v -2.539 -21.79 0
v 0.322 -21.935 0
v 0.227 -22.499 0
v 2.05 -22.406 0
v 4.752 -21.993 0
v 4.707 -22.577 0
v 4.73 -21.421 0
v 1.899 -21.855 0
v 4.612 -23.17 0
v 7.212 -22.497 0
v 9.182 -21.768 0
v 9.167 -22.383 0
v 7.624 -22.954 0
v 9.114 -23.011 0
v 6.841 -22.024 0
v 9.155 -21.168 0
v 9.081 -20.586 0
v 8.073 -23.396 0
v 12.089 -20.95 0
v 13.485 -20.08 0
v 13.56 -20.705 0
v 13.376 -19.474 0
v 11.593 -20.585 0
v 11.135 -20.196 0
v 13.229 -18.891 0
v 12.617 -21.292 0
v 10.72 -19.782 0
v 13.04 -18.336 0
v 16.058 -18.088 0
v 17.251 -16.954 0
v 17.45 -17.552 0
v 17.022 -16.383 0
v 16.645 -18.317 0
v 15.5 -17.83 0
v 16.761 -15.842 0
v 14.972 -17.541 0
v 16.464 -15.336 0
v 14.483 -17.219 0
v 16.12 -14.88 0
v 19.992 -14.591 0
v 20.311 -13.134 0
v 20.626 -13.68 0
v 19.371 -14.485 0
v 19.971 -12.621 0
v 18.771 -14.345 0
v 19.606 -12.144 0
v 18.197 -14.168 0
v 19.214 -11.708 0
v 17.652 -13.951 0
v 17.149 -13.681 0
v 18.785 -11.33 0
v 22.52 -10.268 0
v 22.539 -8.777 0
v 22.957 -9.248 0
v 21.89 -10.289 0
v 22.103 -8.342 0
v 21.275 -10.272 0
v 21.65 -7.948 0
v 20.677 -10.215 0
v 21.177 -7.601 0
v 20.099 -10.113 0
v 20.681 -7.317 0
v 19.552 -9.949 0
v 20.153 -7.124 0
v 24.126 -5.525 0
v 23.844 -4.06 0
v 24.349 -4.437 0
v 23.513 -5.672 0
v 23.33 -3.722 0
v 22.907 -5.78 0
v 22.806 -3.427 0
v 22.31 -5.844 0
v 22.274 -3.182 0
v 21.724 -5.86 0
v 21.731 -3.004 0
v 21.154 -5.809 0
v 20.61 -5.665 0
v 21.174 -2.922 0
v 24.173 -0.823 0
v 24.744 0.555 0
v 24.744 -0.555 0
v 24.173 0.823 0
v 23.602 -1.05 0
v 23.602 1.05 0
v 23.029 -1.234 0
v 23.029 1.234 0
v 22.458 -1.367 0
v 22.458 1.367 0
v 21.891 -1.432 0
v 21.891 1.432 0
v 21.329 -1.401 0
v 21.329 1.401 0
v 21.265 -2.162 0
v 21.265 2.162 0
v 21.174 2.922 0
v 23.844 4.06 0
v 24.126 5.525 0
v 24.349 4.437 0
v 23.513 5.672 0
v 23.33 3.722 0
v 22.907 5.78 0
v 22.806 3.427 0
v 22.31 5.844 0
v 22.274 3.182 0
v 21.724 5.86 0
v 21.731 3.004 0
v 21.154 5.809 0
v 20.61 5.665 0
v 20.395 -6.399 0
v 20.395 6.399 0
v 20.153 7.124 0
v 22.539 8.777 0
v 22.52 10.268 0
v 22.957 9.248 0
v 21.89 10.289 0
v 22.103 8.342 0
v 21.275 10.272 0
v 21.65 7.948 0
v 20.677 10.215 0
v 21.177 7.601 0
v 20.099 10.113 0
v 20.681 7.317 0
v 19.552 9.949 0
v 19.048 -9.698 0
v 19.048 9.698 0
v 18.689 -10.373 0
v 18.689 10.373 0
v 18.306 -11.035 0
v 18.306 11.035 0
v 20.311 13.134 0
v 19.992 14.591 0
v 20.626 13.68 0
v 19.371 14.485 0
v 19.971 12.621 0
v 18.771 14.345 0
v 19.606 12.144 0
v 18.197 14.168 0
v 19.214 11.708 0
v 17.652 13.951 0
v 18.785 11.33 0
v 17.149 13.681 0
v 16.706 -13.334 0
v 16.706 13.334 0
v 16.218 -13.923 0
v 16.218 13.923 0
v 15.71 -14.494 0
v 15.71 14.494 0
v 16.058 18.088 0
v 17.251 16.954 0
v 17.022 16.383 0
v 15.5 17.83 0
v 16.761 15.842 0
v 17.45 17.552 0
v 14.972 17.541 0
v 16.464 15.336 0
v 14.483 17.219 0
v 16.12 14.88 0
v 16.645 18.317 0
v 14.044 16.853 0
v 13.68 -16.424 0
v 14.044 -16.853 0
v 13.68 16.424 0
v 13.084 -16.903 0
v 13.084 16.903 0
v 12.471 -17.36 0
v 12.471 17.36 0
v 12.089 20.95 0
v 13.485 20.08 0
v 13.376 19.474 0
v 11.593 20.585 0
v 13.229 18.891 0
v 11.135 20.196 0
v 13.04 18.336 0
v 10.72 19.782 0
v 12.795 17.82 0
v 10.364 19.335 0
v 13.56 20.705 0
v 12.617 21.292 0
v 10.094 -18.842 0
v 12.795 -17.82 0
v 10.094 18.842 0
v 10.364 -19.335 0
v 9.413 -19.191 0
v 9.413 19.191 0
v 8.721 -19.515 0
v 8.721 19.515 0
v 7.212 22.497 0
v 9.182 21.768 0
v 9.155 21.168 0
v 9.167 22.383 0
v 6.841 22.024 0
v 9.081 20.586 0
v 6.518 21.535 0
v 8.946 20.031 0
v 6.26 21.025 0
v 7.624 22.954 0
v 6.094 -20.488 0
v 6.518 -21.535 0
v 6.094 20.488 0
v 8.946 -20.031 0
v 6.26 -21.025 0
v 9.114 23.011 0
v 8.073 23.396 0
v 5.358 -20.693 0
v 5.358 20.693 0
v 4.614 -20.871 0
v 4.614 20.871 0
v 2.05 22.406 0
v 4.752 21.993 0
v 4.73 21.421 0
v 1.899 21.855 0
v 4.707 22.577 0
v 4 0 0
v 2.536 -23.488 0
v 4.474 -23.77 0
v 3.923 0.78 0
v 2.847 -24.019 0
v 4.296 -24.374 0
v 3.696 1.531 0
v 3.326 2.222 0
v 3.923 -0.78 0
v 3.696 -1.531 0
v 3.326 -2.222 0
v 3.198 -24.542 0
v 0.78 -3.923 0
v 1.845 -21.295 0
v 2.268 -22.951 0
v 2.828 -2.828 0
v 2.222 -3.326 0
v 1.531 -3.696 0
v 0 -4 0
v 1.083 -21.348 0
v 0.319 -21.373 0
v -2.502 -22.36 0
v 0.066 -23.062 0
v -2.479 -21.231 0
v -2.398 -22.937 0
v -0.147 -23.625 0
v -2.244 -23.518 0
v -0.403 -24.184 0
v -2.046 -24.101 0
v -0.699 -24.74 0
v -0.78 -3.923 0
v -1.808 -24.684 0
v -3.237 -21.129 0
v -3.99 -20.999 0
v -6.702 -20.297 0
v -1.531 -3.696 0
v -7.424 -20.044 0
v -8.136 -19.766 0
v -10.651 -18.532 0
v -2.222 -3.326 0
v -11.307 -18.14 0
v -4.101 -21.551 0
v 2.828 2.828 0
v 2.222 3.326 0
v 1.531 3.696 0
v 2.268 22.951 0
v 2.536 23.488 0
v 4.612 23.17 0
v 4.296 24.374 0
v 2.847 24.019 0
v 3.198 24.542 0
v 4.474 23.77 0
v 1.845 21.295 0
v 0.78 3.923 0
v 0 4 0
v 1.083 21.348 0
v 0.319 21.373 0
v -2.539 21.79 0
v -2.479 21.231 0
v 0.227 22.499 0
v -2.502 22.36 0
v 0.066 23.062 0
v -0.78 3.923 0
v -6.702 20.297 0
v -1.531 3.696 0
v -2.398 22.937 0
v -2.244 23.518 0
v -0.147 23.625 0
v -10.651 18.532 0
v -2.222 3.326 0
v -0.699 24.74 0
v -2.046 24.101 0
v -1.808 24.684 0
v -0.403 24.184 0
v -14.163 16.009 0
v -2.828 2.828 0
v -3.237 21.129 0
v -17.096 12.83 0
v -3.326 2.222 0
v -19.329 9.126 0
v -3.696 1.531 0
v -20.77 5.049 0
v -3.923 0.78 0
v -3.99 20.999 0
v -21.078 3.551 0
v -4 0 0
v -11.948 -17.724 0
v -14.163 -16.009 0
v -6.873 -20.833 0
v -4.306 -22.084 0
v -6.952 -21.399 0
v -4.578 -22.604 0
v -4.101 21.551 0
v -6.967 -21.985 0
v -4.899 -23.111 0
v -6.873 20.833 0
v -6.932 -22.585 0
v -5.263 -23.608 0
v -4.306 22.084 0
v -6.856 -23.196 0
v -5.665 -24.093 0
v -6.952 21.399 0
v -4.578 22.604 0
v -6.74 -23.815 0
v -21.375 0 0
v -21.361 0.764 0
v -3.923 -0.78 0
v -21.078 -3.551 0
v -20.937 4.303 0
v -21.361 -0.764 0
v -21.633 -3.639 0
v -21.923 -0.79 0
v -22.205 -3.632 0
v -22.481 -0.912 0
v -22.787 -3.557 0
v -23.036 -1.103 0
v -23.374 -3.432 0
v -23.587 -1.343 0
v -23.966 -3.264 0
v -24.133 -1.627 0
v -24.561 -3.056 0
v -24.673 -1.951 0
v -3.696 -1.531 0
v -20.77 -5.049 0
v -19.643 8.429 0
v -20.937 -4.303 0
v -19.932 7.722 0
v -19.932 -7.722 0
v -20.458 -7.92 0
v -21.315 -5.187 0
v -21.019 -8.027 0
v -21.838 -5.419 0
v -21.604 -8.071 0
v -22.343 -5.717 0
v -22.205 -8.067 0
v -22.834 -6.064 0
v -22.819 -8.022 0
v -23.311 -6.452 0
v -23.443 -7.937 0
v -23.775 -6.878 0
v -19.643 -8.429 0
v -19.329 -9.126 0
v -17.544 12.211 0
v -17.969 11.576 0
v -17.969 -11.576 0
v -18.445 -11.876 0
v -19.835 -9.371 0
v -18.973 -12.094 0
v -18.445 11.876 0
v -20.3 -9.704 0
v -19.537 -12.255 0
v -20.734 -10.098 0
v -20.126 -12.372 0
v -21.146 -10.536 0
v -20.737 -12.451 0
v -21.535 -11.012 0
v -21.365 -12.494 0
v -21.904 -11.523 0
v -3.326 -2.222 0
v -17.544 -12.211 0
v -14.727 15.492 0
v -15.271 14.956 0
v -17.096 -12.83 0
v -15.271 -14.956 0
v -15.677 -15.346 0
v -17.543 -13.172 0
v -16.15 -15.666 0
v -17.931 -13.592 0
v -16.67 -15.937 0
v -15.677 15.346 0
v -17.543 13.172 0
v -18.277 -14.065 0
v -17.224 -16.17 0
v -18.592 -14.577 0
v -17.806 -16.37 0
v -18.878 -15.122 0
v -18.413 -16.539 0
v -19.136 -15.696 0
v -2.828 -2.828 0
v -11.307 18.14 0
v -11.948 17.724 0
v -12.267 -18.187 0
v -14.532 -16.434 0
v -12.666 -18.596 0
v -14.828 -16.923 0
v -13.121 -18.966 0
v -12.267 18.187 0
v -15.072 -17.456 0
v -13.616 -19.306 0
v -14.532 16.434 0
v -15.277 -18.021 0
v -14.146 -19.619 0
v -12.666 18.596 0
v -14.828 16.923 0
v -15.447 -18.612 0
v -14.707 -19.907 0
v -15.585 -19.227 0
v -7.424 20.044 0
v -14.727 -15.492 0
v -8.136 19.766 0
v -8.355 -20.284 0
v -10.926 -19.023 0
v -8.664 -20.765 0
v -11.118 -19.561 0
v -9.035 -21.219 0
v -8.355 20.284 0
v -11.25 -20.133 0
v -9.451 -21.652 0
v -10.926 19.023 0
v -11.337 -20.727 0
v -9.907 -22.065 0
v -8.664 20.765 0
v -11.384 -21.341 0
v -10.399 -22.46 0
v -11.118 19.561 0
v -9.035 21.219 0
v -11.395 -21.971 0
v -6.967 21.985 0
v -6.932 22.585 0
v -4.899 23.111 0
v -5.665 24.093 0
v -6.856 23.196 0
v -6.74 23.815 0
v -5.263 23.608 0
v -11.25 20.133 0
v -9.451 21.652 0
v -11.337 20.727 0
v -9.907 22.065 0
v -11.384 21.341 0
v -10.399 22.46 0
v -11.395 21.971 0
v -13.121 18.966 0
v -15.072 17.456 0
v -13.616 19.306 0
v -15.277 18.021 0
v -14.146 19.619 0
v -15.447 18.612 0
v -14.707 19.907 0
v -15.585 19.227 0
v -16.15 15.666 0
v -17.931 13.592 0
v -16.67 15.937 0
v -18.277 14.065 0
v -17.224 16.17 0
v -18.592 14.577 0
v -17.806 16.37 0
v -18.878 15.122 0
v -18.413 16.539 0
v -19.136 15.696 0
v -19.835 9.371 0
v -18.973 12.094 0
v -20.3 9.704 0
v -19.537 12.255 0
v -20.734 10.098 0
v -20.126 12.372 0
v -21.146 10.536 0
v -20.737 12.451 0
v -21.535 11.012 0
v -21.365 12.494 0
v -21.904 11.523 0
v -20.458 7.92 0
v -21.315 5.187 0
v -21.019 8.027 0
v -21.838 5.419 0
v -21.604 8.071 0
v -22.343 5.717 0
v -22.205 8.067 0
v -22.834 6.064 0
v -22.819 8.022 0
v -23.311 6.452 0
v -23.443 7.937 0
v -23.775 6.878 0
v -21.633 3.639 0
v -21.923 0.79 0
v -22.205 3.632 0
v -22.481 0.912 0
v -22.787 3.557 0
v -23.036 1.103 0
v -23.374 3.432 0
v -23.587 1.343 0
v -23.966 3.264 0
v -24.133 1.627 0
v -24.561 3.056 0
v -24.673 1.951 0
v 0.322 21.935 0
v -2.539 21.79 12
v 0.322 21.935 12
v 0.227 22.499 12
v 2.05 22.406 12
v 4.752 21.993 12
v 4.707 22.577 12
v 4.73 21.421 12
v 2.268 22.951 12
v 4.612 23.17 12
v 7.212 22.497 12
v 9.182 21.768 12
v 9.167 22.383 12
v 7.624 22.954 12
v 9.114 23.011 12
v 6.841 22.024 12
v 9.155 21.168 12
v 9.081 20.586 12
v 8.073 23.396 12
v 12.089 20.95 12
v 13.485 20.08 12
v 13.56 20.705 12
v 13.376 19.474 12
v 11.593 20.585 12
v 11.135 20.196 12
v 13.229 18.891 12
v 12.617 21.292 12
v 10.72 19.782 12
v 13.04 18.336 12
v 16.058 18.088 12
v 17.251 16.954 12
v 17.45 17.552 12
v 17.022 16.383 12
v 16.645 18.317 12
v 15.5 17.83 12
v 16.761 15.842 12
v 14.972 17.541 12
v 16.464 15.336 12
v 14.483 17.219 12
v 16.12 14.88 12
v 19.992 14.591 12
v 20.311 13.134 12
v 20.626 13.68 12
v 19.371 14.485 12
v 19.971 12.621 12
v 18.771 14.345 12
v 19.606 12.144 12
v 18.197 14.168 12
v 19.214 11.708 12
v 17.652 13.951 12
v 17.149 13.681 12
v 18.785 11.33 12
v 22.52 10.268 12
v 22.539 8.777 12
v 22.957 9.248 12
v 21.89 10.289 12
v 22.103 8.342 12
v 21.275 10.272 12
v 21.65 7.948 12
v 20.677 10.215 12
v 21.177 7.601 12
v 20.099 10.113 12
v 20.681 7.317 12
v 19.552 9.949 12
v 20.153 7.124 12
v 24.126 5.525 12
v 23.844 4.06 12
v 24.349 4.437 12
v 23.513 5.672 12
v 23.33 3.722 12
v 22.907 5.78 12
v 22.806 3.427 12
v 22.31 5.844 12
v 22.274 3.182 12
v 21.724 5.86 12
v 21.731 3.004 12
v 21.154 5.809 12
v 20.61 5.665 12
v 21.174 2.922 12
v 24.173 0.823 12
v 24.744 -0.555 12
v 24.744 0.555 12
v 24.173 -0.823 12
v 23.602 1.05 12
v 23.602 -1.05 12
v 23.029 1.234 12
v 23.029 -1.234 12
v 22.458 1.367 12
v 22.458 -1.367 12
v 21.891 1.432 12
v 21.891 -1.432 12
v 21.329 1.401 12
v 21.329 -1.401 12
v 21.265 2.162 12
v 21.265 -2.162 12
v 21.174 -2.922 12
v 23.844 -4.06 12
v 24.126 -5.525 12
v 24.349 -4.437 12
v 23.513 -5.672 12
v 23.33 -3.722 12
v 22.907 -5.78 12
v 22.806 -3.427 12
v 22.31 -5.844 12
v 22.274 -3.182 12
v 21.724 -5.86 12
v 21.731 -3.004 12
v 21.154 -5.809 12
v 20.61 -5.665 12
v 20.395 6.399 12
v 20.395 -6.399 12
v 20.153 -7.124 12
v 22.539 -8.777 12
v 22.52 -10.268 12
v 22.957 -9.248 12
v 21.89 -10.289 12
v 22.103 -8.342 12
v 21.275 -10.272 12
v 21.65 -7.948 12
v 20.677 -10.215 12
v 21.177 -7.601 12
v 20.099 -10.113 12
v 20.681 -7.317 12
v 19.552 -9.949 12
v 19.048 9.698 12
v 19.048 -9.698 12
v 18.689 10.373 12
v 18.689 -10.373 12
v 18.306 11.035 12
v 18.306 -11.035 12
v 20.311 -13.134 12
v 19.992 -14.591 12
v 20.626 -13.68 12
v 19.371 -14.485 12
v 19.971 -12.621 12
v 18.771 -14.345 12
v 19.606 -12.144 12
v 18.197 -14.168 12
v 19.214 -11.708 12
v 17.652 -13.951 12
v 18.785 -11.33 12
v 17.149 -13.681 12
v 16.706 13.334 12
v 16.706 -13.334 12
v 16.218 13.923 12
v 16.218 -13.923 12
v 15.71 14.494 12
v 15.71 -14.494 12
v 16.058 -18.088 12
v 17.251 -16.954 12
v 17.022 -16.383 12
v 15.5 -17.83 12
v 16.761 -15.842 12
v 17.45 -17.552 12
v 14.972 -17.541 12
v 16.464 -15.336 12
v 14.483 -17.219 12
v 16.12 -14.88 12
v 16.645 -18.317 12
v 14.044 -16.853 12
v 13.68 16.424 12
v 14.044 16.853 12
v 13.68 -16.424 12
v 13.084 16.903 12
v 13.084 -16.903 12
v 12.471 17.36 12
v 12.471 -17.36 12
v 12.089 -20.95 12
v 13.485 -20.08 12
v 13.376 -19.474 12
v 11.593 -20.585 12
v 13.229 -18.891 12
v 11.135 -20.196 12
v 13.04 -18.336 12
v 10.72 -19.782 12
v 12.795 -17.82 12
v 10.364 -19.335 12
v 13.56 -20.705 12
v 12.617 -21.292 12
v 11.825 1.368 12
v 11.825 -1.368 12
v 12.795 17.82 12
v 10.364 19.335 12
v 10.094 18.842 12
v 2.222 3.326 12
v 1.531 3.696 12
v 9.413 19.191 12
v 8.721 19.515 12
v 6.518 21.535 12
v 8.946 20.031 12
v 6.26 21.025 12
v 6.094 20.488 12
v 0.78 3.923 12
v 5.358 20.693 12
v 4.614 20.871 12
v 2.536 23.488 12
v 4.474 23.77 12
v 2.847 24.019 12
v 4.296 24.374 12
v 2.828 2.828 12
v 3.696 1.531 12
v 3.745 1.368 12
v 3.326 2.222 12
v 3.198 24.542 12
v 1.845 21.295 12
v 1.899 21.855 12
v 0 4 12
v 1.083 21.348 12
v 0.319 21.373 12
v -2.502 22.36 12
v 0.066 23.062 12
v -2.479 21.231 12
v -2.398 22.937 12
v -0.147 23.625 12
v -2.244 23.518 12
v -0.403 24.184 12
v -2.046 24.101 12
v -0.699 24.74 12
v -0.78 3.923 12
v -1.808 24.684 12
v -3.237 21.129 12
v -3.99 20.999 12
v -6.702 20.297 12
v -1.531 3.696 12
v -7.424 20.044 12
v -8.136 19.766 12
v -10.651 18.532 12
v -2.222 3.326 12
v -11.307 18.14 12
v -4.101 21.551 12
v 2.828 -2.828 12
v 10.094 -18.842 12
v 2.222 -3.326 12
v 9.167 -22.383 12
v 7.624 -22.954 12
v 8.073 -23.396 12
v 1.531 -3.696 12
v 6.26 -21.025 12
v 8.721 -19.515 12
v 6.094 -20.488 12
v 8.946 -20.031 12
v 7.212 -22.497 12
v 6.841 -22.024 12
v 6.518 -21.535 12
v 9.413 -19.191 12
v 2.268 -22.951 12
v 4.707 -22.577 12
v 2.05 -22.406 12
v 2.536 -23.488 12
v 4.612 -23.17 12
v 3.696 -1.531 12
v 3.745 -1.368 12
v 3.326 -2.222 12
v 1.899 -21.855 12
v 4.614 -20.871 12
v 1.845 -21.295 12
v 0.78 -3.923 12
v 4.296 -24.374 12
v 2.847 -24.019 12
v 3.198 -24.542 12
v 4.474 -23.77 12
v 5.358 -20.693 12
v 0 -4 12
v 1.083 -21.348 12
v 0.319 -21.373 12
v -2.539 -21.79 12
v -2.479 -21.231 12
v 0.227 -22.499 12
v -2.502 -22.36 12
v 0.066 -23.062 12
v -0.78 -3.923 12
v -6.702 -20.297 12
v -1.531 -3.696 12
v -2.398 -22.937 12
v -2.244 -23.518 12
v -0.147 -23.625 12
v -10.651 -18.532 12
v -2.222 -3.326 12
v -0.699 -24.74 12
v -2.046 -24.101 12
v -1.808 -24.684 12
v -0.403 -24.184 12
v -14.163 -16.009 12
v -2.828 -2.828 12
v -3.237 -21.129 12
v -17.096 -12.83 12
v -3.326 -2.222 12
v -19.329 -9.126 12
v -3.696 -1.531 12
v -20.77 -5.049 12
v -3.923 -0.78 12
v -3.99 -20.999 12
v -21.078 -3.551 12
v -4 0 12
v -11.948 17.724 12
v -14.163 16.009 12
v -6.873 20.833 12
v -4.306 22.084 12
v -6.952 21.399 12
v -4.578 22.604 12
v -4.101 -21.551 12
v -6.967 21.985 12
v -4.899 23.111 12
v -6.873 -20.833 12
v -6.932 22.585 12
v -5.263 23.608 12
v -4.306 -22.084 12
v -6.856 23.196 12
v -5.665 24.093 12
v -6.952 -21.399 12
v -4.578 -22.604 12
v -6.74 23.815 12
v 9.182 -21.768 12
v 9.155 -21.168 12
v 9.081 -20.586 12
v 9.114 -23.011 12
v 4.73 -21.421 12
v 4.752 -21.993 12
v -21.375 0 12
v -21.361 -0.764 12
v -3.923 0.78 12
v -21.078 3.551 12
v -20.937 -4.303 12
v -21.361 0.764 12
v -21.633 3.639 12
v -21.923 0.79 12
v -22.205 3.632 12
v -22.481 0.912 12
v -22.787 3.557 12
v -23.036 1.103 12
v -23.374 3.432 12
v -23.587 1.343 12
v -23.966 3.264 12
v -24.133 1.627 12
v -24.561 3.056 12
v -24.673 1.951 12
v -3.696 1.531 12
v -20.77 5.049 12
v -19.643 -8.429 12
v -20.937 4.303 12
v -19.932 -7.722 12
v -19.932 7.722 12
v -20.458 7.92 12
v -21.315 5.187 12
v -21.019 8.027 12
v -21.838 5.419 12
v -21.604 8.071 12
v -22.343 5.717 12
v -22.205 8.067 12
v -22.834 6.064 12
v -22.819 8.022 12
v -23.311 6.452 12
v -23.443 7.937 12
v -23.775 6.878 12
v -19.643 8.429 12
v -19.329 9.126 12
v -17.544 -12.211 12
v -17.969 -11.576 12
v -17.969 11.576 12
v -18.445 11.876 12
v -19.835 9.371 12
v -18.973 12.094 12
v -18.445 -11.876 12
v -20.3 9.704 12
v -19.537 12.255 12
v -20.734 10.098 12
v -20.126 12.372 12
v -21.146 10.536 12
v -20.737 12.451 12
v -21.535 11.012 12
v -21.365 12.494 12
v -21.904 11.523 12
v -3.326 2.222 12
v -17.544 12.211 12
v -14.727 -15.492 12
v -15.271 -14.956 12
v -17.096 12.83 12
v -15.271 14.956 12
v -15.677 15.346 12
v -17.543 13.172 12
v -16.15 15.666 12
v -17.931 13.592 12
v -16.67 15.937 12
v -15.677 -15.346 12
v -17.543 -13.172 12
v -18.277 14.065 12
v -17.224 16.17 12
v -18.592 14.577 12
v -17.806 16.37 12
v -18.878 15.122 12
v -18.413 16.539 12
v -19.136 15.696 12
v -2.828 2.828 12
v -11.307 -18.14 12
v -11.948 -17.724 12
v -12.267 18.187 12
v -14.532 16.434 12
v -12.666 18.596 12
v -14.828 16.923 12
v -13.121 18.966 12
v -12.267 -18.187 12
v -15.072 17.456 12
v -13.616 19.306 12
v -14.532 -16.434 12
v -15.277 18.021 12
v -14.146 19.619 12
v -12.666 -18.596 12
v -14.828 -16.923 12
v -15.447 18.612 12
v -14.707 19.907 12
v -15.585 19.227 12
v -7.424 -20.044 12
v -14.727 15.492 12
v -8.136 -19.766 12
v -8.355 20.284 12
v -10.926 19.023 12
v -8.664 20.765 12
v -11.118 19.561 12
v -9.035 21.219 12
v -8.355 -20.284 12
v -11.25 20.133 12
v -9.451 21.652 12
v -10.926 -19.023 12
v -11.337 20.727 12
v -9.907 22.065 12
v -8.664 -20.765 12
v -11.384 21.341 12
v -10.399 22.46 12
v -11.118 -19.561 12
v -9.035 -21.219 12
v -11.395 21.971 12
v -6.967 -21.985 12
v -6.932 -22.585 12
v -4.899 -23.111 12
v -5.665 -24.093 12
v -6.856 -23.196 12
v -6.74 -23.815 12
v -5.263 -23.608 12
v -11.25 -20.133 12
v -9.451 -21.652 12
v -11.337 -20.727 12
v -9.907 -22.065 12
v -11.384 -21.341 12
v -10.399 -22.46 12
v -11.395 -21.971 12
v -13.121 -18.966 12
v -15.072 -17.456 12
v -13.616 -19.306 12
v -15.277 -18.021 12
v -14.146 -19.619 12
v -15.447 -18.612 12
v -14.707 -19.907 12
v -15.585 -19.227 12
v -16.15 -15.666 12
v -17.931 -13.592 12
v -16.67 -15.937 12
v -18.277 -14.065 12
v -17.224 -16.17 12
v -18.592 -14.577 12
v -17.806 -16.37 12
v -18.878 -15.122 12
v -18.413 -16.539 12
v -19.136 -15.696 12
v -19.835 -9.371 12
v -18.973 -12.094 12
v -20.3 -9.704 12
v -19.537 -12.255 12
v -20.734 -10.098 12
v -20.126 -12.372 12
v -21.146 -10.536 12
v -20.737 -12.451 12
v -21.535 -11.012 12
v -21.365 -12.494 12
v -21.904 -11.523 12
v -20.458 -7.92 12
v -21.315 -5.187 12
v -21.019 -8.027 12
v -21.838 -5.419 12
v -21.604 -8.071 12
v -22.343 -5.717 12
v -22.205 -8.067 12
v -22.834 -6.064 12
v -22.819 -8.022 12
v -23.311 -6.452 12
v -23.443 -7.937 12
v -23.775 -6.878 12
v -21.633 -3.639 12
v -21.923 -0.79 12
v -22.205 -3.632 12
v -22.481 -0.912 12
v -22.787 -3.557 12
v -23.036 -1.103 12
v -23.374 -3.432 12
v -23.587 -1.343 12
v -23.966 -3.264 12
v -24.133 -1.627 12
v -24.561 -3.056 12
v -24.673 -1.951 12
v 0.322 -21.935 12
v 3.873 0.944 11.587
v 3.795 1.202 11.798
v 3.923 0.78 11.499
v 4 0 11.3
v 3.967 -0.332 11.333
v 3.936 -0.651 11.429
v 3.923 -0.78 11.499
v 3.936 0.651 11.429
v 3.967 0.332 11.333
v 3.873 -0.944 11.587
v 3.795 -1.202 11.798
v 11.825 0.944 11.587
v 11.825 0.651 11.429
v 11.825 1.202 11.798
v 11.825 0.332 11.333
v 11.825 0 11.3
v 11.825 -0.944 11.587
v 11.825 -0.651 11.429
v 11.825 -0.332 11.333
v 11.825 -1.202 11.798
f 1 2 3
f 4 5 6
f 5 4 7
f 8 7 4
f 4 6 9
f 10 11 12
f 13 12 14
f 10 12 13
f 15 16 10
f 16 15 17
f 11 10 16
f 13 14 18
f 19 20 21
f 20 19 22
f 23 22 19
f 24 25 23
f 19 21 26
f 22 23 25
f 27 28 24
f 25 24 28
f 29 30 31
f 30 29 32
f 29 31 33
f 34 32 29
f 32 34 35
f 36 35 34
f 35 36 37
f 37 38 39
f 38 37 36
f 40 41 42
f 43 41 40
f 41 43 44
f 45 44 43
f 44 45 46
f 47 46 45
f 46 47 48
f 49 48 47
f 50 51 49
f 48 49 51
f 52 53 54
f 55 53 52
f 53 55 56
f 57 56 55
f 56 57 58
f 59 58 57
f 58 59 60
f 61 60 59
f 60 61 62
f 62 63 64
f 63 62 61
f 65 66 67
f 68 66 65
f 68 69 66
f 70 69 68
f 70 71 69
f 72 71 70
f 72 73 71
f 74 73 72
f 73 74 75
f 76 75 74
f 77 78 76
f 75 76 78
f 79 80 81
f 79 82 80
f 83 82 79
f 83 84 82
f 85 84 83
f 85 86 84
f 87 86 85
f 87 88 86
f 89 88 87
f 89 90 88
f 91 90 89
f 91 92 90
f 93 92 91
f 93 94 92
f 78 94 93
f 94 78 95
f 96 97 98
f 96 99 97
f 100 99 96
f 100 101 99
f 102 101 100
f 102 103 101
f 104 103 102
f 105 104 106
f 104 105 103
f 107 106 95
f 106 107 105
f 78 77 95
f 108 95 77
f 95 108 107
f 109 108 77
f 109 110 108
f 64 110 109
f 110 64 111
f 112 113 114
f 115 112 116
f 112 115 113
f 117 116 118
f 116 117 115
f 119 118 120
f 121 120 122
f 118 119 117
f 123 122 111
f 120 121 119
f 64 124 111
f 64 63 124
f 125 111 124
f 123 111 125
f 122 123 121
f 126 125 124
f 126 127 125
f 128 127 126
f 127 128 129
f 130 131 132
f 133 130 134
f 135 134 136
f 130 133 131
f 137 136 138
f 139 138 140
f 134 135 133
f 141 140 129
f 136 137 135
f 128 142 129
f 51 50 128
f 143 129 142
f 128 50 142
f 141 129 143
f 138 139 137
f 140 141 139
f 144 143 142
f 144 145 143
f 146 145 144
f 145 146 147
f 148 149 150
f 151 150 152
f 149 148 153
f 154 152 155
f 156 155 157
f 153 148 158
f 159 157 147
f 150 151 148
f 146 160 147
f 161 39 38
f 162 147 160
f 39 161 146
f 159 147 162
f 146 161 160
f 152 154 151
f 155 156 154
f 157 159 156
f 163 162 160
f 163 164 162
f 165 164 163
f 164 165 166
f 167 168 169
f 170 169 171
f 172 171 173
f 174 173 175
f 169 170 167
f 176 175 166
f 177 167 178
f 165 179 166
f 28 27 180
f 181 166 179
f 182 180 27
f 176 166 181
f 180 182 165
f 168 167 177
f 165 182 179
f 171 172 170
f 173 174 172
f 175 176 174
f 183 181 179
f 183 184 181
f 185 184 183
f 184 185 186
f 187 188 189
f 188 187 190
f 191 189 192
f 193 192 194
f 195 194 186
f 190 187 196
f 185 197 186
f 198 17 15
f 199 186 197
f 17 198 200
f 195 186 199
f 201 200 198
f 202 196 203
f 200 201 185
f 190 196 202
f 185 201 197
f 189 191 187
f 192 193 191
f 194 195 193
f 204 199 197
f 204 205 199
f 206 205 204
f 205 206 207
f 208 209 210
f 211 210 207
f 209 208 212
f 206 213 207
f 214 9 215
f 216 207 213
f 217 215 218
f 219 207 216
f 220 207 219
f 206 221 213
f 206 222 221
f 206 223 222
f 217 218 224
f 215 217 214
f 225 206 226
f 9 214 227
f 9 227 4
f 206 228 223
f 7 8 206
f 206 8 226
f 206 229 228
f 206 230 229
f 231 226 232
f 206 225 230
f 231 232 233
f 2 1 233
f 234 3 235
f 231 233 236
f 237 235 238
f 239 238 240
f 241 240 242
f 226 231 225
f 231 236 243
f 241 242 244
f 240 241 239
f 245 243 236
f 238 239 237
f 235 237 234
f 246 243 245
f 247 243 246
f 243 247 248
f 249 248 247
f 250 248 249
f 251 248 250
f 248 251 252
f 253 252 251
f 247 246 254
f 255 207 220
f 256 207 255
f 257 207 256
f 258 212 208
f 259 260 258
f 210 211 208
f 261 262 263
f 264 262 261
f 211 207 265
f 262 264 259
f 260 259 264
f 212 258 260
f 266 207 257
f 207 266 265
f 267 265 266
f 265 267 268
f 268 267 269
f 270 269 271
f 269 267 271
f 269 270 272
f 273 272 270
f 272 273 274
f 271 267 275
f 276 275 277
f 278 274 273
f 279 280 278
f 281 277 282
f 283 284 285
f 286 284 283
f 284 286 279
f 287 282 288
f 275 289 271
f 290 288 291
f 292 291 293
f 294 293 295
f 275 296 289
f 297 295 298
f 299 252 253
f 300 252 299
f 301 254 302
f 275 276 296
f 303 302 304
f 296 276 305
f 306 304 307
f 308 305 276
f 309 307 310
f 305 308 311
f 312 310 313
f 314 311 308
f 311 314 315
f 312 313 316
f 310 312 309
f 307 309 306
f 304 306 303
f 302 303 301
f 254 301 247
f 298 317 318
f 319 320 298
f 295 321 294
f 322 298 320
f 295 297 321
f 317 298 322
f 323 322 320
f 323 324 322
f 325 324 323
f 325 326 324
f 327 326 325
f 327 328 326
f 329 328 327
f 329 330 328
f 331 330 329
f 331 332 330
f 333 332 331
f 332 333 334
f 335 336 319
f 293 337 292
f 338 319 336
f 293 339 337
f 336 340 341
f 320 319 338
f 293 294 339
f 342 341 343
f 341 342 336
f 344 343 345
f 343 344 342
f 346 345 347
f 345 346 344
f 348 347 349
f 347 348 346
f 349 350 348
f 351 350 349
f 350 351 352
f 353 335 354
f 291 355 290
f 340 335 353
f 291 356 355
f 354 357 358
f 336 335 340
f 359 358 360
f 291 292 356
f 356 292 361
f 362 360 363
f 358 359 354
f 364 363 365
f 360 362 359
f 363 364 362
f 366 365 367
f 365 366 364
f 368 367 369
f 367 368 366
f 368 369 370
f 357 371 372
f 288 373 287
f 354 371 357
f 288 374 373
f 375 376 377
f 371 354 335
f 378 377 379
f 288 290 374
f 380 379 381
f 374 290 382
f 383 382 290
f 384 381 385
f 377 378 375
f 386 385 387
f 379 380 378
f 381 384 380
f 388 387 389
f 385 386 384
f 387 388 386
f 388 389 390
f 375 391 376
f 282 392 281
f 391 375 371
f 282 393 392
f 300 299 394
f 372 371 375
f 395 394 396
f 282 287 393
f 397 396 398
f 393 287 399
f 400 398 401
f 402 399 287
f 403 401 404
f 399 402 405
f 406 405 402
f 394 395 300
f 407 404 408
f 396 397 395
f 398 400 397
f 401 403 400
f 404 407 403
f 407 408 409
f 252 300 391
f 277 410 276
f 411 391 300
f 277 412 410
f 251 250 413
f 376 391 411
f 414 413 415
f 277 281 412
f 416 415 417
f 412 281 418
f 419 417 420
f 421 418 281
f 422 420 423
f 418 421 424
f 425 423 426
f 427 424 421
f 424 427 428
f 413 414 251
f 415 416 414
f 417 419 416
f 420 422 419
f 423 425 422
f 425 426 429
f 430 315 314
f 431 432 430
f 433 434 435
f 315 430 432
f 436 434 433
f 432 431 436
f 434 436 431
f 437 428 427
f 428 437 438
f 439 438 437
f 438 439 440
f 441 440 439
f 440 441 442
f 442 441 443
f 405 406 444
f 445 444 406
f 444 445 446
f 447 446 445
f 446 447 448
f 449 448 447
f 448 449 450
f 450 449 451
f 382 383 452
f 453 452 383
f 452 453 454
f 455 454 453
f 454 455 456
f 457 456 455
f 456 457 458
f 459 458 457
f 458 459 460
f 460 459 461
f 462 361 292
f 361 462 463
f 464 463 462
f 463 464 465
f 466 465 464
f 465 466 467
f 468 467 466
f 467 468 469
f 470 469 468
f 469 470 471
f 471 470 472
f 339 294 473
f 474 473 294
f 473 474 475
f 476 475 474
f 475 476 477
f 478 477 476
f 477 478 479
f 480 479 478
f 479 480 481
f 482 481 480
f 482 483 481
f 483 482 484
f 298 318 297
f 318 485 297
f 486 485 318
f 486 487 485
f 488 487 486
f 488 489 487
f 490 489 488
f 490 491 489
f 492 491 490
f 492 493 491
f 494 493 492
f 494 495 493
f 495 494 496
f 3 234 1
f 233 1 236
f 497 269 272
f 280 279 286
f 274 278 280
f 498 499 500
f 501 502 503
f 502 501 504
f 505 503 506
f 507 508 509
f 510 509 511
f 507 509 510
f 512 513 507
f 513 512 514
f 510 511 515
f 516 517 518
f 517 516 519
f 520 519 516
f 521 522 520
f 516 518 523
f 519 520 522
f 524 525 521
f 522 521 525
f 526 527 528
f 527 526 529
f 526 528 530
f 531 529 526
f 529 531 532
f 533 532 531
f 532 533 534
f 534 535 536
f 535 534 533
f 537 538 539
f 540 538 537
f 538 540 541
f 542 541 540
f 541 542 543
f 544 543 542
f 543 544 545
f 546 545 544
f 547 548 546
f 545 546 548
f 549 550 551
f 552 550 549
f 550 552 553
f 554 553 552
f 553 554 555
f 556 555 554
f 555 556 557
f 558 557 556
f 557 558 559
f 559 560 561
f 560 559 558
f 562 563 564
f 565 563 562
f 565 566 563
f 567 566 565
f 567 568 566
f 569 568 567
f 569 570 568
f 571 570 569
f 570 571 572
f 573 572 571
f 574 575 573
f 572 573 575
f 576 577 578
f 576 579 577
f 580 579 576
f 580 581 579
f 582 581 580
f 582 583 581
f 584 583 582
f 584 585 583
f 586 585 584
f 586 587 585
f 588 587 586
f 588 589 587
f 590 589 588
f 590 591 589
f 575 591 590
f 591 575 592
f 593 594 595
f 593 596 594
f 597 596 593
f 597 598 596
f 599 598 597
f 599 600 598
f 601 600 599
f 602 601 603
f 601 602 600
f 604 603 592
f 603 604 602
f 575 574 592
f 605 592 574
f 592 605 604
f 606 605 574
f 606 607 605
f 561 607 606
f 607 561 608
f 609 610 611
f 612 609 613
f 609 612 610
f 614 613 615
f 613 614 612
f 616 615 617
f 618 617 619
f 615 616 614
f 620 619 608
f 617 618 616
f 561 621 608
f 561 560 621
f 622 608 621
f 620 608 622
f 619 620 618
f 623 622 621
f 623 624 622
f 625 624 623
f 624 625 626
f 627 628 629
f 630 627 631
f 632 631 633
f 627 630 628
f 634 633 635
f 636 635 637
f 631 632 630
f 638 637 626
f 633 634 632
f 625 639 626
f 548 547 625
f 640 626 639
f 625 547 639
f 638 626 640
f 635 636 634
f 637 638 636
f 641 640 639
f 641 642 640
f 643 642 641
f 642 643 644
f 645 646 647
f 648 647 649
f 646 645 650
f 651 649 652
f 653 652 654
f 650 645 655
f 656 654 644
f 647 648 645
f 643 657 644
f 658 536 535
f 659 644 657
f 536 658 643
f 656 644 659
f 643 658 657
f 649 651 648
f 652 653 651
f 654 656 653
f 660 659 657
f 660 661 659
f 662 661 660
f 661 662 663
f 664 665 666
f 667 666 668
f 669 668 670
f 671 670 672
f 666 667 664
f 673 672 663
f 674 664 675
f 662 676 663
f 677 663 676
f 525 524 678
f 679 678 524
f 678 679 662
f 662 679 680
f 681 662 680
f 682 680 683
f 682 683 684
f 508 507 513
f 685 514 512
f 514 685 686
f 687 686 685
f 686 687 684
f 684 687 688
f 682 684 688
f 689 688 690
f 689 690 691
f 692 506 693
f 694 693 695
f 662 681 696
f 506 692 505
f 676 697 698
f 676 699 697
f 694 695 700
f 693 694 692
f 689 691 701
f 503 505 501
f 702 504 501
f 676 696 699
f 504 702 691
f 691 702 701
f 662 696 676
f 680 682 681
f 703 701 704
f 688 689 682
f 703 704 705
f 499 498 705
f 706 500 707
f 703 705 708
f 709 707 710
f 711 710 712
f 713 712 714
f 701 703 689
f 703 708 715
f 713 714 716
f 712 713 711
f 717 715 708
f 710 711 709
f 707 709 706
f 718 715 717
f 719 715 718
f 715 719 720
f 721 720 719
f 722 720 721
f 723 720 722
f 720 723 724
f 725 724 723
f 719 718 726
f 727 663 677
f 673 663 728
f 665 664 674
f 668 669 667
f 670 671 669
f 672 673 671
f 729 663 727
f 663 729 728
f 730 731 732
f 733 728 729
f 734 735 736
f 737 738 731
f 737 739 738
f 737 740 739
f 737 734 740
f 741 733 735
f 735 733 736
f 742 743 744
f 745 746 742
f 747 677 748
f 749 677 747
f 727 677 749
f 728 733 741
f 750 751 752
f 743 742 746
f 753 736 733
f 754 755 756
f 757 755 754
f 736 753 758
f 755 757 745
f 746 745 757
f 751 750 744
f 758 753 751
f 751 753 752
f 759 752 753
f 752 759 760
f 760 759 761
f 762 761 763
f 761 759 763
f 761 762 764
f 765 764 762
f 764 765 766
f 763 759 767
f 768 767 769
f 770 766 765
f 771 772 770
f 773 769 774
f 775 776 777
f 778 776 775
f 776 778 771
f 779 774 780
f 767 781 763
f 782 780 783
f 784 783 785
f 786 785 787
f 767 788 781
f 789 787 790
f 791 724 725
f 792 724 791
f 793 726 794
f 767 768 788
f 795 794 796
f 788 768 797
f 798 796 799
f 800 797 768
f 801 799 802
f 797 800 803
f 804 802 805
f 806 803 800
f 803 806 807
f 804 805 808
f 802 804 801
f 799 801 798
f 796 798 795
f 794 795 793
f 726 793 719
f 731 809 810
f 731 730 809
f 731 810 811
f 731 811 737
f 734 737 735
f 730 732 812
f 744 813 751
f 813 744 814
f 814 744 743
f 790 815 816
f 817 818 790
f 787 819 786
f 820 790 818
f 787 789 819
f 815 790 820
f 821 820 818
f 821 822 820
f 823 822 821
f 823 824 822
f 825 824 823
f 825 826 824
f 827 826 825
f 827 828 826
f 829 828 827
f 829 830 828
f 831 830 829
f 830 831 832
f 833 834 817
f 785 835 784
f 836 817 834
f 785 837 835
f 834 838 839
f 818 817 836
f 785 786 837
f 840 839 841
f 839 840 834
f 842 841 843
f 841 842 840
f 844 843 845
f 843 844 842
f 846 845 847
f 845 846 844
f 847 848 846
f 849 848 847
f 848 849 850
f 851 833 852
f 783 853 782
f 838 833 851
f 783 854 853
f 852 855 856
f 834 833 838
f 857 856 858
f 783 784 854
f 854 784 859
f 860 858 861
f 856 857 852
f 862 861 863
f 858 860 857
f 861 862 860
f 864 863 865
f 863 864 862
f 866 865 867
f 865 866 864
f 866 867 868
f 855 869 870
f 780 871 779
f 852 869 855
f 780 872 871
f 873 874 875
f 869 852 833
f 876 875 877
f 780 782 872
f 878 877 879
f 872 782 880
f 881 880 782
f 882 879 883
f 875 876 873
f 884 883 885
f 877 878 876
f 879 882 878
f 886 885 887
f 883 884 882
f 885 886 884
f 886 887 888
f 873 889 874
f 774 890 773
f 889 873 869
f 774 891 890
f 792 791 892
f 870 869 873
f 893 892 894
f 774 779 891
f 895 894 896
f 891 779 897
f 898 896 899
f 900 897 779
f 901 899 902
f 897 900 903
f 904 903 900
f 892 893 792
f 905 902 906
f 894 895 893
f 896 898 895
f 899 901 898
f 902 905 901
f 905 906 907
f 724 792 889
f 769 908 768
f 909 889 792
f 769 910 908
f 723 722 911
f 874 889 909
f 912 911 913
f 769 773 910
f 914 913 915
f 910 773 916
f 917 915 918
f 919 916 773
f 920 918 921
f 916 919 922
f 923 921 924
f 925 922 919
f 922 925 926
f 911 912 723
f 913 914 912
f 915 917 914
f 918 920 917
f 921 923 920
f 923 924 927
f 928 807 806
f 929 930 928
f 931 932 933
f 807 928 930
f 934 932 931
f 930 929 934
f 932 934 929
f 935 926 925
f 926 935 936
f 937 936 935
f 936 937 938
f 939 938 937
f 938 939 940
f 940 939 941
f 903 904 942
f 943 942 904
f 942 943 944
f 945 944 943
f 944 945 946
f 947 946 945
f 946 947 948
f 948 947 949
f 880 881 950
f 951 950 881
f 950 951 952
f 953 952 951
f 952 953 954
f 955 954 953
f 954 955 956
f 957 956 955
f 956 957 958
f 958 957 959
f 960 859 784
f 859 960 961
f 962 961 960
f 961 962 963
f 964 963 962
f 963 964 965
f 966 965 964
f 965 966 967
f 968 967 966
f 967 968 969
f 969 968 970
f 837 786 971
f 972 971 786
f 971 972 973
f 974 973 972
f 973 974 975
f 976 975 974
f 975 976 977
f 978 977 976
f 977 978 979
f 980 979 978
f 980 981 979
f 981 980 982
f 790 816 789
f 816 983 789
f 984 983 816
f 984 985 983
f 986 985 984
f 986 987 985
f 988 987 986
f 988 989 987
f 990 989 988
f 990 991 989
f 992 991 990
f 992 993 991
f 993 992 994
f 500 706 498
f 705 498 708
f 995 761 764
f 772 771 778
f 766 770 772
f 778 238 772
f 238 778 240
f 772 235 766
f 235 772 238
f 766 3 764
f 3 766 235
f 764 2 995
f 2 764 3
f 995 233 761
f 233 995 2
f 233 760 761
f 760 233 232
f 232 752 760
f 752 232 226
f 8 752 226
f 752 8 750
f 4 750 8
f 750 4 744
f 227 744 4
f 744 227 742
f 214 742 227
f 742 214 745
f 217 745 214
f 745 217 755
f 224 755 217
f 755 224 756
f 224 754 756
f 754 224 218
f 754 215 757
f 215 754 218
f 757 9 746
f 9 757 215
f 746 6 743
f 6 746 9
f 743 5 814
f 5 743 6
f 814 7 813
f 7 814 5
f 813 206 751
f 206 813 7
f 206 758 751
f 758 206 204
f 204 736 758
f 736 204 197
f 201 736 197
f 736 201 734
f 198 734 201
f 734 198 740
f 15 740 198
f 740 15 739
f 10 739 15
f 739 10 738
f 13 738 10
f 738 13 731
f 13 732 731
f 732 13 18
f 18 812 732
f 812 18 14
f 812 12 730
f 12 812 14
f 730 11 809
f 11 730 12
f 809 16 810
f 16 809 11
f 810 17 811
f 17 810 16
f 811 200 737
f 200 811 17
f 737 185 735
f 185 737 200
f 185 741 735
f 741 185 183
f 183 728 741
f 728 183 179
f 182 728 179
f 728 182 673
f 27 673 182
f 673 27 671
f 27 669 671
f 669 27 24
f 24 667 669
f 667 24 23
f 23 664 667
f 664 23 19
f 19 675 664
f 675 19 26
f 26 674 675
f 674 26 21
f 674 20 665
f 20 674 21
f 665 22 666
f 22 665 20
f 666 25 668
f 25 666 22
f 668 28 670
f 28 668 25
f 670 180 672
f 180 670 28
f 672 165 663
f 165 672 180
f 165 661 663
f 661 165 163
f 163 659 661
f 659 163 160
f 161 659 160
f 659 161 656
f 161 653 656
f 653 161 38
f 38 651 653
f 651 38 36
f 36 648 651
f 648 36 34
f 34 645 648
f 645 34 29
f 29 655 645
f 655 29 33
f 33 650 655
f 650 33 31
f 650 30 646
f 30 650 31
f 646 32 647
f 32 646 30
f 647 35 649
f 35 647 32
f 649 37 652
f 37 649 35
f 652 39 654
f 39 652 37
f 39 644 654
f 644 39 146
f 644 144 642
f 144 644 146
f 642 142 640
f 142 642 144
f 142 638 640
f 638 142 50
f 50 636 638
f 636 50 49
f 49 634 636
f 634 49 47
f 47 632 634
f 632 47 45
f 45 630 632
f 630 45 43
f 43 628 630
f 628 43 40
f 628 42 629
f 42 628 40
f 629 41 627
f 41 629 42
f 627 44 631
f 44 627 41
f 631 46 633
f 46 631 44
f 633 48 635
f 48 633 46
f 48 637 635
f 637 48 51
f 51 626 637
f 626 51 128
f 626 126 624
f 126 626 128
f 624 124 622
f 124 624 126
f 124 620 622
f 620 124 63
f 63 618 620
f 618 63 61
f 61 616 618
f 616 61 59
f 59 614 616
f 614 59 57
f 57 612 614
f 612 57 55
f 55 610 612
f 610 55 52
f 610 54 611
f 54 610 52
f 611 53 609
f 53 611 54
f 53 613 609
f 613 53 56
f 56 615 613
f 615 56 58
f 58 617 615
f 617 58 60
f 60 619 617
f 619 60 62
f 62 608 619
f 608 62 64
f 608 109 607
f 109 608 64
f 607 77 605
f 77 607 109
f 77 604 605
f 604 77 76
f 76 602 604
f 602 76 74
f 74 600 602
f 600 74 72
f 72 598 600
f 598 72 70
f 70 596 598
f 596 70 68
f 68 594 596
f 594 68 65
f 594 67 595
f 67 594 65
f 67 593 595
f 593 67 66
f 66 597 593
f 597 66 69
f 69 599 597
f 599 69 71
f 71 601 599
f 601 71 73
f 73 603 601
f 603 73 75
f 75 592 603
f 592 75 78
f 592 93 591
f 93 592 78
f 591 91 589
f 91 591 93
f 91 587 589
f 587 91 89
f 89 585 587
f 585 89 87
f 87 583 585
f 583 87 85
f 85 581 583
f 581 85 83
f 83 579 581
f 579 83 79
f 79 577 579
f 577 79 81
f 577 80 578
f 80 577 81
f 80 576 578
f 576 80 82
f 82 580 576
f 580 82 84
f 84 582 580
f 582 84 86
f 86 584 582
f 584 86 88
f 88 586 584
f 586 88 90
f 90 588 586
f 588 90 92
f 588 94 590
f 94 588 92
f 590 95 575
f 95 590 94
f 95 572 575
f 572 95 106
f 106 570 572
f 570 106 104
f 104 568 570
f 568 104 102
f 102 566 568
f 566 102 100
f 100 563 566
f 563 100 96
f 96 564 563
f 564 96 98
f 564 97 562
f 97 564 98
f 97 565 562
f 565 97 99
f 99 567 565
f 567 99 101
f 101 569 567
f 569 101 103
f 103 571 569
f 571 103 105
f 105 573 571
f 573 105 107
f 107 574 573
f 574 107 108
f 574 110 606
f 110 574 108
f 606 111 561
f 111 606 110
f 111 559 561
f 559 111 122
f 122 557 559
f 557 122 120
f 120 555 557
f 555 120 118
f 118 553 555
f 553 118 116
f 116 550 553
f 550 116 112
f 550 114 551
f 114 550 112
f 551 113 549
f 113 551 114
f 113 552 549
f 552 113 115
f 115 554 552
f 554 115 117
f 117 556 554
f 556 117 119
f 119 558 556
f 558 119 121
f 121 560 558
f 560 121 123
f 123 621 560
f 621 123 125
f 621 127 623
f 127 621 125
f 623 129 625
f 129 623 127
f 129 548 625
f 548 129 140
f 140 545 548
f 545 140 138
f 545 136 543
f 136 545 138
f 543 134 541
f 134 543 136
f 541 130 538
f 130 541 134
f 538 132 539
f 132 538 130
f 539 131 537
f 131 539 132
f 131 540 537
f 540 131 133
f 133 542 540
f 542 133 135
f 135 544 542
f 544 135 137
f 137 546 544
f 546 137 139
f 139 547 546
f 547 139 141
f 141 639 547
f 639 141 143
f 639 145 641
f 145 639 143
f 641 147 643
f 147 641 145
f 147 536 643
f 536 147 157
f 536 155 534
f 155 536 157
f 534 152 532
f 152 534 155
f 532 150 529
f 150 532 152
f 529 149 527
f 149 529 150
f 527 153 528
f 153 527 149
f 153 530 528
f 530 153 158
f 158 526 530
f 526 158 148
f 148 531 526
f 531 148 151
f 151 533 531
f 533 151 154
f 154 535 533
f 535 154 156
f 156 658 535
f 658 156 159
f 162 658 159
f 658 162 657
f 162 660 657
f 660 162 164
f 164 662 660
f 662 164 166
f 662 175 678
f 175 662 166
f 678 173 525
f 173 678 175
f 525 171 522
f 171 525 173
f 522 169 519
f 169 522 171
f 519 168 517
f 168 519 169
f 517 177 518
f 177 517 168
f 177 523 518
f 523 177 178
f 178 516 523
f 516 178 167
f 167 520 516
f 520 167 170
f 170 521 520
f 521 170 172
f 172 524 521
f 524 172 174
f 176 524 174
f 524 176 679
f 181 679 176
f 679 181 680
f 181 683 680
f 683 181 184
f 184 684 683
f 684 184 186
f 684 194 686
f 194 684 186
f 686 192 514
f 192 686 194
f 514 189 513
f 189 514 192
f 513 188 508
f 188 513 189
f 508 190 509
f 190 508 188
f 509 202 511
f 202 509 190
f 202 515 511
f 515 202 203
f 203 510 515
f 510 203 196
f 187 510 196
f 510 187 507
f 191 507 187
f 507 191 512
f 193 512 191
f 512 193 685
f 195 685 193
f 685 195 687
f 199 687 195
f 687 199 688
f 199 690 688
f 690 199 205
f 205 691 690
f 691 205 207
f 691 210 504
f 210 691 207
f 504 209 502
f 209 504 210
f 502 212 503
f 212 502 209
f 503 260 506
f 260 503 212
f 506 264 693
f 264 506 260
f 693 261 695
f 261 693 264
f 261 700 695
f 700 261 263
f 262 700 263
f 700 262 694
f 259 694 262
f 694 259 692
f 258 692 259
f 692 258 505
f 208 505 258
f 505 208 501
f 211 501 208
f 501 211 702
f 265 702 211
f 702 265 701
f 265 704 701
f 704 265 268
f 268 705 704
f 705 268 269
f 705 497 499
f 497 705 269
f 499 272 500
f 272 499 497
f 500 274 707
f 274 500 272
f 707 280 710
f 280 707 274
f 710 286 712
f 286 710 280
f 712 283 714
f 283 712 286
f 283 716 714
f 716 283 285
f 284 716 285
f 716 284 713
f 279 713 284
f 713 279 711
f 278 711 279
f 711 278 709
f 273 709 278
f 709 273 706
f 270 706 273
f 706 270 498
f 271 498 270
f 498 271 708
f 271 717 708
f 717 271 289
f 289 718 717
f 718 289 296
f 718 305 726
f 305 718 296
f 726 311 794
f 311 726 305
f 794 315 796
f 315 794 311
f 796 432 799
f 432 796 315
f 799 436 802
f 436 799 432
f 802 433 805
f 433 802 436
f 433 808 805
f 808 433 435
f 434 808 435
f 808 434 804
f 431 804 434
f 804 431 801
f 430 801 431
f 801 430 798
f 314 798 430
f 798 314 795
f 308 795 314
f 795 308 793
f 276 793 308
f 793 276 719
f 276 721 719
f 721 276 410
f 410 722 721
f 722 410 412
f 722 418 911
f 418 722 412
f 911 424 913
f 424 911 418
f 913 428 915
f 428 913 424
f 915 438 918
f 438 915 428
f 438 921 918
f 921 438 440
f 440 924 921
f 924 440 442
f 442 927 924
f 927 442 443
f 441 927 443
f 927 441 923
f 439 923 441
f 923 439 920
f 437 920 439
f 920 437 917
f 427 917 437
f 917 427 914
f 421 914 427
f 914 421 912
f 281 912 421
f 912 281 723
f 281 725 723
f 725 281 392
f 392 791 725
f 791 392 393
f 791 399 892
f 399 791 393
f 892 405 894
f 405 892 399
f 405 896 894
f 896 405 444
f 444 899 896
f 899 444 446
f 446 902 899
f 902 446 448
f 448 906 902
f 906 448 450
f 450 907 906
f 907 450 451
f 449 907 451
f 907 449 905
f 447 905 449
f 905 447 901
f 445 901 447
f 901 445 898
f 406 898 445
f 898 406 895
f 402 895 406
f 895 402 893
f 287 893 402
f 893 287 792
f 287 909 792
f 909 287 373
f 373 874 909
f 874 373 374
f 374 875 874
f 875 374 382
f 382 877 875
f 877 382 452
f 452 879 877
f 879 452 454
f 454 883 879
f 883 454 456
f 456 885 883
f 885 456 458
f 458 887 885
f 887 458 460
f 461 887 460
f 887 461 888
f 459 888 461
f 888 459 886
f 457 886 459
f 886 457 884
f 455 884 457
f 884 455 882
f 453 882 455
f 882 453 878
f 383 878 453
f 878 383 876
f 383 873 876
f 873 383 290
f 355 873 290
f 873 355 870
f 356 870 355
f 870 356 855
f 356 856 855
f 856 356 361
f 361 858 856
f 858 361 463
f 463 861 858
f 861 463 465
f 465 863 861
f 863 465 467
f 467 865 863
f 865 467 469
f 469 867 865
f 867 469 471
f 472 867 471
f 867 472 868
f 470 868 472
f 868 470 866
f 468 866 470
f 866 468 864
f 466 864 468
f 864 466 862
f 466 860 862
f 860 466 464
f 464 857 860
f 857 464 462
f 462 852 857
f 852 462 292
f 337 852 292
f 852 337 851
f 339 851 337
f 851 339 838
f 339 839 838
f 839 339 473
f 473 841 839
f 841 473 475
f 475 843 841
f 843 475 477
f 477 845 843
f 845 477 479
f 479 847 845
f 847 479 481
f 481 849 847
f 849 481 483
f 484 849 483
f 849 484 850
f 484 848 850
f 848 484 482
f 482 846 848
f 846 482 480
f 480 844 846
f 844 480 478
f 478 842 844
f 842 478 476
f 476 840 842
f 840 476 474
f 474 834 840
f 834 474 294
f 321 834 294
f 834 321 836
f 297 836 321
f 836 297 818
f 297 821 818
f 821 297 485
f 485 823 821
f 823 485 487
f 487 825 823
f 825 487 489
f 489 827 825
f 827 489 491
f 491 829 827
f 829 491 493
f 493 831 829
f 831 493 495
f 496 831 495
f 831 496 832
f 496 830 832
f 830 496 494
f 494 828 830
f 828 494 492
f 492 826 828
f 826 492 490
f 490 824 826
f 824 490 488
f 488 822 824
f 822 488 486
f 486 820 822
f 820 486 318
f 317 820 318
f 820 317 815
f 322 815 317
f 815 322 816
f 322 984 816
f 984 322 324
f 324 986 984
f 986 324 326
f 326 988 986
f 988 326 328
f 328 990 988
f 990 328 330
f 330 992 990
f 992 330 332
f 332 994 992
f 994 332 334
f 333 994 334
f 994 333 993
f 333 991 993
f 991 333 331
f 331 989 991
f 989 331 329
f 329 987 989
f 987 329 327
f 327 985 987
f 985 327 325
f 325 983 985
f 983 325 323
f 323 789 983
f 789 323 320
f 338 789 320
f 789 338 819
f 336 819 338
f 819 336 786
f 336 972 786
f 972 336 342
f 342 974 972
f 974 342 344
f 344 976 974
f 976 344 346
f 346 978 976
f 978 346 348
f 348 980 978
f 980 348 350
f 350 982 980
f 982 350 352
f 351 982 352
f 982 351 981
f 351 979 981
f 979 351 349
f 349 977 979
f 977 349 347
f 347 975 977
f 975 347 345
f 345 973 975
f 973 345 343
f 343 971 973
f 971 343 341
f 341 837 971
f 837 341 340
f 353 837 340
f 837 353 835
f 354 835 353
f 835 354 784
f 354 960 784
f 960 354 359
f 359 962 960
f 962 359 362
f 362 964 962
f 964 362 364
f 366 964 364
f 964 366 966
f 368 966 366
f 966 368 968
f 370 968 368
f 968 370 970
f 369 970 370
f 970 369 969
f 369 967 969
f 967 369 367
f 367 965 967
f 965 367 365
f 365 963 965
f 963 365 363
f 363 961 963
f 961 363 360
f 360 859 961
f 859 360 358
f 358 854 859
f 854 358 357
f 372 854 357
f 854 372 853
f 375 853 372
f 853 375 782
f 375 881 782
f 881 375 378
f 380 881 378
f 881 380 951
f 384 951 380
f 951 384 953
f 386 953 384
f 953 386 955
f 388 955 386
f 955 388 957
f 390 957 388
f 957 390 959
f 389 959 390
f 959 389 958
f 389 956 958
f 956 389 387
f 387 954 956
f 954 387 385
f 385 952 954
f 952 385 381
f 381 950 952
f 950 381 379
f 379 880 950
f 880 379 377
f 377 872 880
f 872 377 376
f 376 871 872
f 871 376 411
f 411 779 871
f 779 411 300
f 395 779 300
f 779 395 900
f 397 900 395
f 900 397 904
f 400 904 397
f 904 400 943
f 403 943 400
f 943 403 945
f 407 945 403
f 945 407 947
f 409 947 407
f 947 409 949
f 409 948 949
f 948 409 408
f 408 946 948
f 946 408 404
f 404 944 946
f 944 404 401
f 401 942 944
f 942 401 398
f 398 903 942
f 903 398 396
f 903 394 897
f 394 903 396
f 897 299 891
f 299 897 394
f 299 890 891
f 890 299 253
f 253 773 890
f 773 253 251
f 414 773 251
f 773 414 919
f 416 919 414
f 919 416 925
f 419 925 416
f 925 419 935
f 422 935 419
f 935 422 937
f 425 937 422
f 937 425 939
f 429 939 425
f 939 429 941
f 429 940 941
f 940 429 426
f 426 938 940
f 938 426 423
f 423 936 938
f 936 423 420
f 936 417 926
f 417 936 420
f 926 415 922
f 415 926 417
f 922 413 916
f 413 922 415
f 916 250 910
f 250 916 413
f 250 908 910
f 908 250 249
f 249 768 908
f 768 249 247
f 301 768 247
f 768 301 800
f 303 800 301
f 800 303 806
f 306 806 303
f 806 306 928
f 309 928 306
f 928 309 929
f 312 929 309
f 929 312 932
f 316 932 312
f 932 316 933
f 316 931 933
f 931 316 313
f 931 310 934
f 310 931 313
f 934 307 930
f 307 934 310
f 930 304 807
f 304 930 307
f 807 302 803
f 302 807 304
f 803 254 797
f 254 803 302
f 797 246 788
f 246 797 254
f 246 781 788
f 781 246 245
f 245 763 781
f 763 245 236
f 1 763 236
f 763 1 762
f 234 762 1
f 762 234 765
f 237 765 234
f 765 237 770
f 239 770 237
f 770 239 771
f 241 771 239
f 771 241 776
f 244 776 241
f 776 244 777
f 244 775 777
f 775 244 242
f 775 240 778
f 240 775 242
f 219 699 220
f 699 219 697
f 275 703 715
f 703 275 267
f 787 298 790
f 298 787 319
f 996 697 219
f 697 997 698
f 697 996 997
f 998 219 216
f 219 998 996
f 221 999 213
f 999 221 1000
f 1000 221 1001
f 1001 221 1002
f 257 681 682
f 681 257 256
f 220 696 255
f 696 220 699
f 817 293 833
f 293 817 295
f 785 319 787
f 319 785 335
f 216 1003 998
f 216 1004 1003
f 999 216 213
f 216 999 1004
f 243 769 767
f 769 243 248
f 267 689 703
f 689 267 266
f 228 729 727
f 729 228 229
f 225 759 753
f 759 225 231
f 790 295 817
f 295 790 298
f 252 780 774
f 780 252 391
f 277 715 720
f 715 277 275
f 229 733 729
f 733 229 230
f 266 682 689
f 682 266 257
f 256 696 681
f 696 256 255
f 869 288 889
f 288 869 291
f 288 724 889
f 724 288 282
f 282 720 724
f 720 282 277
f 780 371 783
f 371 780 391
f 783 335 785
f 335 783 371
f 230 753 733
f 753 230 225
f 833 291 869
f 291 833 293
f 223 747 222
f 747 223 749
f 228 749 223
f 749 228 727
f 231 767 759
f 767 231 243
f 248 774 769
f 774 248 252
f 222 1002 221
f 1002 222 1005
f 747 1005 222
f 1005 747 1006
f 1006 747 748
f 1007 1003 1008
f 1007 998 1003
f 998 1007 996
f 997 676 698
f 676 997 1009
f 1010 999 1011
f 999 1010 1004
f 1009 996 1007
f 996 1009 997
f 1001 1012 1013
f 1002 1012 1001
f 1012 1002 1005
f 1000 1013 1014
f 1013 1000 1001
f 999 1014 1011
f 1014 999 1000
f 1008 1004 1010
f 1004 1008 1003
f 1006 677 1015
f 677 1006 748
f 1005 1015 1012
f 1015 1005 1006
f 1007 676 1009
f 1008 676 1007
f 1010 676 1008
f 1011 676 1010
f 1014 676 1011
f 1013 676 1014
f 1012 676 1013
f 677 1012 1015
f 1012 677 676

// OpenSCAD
$fn = 32;

// ----------------------------------------------------------------------
// Spur gear: m=1.5 z=31, 49.5 mm tip diameter x 12 mm
// ----------------------------------------------------------------------

// --- parameters (mm) ---
gear_module = 1.5;        // module
tooth_count = 31;         // number of teeth
gear_w = 12;              // face width
pa = 20;                  // pressure angle, deg
bore = 8;                 // shaft bore
set_d = 3.4;              // set screw tap hole
set_z = 13;               // set screw height

/* --- involute profile --- */
pitch_r = gear_module * tooth_count / 2;
base_r = pitch_r * cos(pa);
tip_r = pitch_r + gear_module;
root_r = pitch_r - 1.25 * gear_module;
flank_steps = 6;

function inv_deg(a) = (tan(a) - a * PI / 180) * 180 / PI;
function flank_r(i) = root_r + (tip_r - root_r) * i / flank_steps;
function half_angle(r) = 90 / tooth_count + inv_deg(pa) - inv_deg(acos(min(1, base_r / r)));
function tooth_pt(k, i, side) =
    let (r = flank_r(i), a = k * 360 / tooth_count + side * half_angle(r))
    [r * cos(a), r * sin(a)];

module tooth_profile() {
  polygon(points = [
    for (k = [0 : tooth_count - 1])
      each [
        for (i = [0 : flank_steps]) tooth_pt(k, i, -1),
        for (i = [flank_steps : -1 : 0]) tooth_pt(k, i, 1),
        let (ta = (k + 0.5) * 360 / tooth_count)
          [root_r * cos(ta), root_r * sin(ta)]
      ]
  ]);
}

module gear_disc() {
  linear_extrude(height = gear_w) tooth_profile();
}

difference() {
  gear_disc();
  translate([0, 0, -1]) cylinder(h = gear_w + 3, d = bore);
  /* set screw, drilled radially */
  translate([-1, 0, set_z]) rotate([0, 90, 0]) cylinder(h = (root_r * 0.6), d = set_d);
}
